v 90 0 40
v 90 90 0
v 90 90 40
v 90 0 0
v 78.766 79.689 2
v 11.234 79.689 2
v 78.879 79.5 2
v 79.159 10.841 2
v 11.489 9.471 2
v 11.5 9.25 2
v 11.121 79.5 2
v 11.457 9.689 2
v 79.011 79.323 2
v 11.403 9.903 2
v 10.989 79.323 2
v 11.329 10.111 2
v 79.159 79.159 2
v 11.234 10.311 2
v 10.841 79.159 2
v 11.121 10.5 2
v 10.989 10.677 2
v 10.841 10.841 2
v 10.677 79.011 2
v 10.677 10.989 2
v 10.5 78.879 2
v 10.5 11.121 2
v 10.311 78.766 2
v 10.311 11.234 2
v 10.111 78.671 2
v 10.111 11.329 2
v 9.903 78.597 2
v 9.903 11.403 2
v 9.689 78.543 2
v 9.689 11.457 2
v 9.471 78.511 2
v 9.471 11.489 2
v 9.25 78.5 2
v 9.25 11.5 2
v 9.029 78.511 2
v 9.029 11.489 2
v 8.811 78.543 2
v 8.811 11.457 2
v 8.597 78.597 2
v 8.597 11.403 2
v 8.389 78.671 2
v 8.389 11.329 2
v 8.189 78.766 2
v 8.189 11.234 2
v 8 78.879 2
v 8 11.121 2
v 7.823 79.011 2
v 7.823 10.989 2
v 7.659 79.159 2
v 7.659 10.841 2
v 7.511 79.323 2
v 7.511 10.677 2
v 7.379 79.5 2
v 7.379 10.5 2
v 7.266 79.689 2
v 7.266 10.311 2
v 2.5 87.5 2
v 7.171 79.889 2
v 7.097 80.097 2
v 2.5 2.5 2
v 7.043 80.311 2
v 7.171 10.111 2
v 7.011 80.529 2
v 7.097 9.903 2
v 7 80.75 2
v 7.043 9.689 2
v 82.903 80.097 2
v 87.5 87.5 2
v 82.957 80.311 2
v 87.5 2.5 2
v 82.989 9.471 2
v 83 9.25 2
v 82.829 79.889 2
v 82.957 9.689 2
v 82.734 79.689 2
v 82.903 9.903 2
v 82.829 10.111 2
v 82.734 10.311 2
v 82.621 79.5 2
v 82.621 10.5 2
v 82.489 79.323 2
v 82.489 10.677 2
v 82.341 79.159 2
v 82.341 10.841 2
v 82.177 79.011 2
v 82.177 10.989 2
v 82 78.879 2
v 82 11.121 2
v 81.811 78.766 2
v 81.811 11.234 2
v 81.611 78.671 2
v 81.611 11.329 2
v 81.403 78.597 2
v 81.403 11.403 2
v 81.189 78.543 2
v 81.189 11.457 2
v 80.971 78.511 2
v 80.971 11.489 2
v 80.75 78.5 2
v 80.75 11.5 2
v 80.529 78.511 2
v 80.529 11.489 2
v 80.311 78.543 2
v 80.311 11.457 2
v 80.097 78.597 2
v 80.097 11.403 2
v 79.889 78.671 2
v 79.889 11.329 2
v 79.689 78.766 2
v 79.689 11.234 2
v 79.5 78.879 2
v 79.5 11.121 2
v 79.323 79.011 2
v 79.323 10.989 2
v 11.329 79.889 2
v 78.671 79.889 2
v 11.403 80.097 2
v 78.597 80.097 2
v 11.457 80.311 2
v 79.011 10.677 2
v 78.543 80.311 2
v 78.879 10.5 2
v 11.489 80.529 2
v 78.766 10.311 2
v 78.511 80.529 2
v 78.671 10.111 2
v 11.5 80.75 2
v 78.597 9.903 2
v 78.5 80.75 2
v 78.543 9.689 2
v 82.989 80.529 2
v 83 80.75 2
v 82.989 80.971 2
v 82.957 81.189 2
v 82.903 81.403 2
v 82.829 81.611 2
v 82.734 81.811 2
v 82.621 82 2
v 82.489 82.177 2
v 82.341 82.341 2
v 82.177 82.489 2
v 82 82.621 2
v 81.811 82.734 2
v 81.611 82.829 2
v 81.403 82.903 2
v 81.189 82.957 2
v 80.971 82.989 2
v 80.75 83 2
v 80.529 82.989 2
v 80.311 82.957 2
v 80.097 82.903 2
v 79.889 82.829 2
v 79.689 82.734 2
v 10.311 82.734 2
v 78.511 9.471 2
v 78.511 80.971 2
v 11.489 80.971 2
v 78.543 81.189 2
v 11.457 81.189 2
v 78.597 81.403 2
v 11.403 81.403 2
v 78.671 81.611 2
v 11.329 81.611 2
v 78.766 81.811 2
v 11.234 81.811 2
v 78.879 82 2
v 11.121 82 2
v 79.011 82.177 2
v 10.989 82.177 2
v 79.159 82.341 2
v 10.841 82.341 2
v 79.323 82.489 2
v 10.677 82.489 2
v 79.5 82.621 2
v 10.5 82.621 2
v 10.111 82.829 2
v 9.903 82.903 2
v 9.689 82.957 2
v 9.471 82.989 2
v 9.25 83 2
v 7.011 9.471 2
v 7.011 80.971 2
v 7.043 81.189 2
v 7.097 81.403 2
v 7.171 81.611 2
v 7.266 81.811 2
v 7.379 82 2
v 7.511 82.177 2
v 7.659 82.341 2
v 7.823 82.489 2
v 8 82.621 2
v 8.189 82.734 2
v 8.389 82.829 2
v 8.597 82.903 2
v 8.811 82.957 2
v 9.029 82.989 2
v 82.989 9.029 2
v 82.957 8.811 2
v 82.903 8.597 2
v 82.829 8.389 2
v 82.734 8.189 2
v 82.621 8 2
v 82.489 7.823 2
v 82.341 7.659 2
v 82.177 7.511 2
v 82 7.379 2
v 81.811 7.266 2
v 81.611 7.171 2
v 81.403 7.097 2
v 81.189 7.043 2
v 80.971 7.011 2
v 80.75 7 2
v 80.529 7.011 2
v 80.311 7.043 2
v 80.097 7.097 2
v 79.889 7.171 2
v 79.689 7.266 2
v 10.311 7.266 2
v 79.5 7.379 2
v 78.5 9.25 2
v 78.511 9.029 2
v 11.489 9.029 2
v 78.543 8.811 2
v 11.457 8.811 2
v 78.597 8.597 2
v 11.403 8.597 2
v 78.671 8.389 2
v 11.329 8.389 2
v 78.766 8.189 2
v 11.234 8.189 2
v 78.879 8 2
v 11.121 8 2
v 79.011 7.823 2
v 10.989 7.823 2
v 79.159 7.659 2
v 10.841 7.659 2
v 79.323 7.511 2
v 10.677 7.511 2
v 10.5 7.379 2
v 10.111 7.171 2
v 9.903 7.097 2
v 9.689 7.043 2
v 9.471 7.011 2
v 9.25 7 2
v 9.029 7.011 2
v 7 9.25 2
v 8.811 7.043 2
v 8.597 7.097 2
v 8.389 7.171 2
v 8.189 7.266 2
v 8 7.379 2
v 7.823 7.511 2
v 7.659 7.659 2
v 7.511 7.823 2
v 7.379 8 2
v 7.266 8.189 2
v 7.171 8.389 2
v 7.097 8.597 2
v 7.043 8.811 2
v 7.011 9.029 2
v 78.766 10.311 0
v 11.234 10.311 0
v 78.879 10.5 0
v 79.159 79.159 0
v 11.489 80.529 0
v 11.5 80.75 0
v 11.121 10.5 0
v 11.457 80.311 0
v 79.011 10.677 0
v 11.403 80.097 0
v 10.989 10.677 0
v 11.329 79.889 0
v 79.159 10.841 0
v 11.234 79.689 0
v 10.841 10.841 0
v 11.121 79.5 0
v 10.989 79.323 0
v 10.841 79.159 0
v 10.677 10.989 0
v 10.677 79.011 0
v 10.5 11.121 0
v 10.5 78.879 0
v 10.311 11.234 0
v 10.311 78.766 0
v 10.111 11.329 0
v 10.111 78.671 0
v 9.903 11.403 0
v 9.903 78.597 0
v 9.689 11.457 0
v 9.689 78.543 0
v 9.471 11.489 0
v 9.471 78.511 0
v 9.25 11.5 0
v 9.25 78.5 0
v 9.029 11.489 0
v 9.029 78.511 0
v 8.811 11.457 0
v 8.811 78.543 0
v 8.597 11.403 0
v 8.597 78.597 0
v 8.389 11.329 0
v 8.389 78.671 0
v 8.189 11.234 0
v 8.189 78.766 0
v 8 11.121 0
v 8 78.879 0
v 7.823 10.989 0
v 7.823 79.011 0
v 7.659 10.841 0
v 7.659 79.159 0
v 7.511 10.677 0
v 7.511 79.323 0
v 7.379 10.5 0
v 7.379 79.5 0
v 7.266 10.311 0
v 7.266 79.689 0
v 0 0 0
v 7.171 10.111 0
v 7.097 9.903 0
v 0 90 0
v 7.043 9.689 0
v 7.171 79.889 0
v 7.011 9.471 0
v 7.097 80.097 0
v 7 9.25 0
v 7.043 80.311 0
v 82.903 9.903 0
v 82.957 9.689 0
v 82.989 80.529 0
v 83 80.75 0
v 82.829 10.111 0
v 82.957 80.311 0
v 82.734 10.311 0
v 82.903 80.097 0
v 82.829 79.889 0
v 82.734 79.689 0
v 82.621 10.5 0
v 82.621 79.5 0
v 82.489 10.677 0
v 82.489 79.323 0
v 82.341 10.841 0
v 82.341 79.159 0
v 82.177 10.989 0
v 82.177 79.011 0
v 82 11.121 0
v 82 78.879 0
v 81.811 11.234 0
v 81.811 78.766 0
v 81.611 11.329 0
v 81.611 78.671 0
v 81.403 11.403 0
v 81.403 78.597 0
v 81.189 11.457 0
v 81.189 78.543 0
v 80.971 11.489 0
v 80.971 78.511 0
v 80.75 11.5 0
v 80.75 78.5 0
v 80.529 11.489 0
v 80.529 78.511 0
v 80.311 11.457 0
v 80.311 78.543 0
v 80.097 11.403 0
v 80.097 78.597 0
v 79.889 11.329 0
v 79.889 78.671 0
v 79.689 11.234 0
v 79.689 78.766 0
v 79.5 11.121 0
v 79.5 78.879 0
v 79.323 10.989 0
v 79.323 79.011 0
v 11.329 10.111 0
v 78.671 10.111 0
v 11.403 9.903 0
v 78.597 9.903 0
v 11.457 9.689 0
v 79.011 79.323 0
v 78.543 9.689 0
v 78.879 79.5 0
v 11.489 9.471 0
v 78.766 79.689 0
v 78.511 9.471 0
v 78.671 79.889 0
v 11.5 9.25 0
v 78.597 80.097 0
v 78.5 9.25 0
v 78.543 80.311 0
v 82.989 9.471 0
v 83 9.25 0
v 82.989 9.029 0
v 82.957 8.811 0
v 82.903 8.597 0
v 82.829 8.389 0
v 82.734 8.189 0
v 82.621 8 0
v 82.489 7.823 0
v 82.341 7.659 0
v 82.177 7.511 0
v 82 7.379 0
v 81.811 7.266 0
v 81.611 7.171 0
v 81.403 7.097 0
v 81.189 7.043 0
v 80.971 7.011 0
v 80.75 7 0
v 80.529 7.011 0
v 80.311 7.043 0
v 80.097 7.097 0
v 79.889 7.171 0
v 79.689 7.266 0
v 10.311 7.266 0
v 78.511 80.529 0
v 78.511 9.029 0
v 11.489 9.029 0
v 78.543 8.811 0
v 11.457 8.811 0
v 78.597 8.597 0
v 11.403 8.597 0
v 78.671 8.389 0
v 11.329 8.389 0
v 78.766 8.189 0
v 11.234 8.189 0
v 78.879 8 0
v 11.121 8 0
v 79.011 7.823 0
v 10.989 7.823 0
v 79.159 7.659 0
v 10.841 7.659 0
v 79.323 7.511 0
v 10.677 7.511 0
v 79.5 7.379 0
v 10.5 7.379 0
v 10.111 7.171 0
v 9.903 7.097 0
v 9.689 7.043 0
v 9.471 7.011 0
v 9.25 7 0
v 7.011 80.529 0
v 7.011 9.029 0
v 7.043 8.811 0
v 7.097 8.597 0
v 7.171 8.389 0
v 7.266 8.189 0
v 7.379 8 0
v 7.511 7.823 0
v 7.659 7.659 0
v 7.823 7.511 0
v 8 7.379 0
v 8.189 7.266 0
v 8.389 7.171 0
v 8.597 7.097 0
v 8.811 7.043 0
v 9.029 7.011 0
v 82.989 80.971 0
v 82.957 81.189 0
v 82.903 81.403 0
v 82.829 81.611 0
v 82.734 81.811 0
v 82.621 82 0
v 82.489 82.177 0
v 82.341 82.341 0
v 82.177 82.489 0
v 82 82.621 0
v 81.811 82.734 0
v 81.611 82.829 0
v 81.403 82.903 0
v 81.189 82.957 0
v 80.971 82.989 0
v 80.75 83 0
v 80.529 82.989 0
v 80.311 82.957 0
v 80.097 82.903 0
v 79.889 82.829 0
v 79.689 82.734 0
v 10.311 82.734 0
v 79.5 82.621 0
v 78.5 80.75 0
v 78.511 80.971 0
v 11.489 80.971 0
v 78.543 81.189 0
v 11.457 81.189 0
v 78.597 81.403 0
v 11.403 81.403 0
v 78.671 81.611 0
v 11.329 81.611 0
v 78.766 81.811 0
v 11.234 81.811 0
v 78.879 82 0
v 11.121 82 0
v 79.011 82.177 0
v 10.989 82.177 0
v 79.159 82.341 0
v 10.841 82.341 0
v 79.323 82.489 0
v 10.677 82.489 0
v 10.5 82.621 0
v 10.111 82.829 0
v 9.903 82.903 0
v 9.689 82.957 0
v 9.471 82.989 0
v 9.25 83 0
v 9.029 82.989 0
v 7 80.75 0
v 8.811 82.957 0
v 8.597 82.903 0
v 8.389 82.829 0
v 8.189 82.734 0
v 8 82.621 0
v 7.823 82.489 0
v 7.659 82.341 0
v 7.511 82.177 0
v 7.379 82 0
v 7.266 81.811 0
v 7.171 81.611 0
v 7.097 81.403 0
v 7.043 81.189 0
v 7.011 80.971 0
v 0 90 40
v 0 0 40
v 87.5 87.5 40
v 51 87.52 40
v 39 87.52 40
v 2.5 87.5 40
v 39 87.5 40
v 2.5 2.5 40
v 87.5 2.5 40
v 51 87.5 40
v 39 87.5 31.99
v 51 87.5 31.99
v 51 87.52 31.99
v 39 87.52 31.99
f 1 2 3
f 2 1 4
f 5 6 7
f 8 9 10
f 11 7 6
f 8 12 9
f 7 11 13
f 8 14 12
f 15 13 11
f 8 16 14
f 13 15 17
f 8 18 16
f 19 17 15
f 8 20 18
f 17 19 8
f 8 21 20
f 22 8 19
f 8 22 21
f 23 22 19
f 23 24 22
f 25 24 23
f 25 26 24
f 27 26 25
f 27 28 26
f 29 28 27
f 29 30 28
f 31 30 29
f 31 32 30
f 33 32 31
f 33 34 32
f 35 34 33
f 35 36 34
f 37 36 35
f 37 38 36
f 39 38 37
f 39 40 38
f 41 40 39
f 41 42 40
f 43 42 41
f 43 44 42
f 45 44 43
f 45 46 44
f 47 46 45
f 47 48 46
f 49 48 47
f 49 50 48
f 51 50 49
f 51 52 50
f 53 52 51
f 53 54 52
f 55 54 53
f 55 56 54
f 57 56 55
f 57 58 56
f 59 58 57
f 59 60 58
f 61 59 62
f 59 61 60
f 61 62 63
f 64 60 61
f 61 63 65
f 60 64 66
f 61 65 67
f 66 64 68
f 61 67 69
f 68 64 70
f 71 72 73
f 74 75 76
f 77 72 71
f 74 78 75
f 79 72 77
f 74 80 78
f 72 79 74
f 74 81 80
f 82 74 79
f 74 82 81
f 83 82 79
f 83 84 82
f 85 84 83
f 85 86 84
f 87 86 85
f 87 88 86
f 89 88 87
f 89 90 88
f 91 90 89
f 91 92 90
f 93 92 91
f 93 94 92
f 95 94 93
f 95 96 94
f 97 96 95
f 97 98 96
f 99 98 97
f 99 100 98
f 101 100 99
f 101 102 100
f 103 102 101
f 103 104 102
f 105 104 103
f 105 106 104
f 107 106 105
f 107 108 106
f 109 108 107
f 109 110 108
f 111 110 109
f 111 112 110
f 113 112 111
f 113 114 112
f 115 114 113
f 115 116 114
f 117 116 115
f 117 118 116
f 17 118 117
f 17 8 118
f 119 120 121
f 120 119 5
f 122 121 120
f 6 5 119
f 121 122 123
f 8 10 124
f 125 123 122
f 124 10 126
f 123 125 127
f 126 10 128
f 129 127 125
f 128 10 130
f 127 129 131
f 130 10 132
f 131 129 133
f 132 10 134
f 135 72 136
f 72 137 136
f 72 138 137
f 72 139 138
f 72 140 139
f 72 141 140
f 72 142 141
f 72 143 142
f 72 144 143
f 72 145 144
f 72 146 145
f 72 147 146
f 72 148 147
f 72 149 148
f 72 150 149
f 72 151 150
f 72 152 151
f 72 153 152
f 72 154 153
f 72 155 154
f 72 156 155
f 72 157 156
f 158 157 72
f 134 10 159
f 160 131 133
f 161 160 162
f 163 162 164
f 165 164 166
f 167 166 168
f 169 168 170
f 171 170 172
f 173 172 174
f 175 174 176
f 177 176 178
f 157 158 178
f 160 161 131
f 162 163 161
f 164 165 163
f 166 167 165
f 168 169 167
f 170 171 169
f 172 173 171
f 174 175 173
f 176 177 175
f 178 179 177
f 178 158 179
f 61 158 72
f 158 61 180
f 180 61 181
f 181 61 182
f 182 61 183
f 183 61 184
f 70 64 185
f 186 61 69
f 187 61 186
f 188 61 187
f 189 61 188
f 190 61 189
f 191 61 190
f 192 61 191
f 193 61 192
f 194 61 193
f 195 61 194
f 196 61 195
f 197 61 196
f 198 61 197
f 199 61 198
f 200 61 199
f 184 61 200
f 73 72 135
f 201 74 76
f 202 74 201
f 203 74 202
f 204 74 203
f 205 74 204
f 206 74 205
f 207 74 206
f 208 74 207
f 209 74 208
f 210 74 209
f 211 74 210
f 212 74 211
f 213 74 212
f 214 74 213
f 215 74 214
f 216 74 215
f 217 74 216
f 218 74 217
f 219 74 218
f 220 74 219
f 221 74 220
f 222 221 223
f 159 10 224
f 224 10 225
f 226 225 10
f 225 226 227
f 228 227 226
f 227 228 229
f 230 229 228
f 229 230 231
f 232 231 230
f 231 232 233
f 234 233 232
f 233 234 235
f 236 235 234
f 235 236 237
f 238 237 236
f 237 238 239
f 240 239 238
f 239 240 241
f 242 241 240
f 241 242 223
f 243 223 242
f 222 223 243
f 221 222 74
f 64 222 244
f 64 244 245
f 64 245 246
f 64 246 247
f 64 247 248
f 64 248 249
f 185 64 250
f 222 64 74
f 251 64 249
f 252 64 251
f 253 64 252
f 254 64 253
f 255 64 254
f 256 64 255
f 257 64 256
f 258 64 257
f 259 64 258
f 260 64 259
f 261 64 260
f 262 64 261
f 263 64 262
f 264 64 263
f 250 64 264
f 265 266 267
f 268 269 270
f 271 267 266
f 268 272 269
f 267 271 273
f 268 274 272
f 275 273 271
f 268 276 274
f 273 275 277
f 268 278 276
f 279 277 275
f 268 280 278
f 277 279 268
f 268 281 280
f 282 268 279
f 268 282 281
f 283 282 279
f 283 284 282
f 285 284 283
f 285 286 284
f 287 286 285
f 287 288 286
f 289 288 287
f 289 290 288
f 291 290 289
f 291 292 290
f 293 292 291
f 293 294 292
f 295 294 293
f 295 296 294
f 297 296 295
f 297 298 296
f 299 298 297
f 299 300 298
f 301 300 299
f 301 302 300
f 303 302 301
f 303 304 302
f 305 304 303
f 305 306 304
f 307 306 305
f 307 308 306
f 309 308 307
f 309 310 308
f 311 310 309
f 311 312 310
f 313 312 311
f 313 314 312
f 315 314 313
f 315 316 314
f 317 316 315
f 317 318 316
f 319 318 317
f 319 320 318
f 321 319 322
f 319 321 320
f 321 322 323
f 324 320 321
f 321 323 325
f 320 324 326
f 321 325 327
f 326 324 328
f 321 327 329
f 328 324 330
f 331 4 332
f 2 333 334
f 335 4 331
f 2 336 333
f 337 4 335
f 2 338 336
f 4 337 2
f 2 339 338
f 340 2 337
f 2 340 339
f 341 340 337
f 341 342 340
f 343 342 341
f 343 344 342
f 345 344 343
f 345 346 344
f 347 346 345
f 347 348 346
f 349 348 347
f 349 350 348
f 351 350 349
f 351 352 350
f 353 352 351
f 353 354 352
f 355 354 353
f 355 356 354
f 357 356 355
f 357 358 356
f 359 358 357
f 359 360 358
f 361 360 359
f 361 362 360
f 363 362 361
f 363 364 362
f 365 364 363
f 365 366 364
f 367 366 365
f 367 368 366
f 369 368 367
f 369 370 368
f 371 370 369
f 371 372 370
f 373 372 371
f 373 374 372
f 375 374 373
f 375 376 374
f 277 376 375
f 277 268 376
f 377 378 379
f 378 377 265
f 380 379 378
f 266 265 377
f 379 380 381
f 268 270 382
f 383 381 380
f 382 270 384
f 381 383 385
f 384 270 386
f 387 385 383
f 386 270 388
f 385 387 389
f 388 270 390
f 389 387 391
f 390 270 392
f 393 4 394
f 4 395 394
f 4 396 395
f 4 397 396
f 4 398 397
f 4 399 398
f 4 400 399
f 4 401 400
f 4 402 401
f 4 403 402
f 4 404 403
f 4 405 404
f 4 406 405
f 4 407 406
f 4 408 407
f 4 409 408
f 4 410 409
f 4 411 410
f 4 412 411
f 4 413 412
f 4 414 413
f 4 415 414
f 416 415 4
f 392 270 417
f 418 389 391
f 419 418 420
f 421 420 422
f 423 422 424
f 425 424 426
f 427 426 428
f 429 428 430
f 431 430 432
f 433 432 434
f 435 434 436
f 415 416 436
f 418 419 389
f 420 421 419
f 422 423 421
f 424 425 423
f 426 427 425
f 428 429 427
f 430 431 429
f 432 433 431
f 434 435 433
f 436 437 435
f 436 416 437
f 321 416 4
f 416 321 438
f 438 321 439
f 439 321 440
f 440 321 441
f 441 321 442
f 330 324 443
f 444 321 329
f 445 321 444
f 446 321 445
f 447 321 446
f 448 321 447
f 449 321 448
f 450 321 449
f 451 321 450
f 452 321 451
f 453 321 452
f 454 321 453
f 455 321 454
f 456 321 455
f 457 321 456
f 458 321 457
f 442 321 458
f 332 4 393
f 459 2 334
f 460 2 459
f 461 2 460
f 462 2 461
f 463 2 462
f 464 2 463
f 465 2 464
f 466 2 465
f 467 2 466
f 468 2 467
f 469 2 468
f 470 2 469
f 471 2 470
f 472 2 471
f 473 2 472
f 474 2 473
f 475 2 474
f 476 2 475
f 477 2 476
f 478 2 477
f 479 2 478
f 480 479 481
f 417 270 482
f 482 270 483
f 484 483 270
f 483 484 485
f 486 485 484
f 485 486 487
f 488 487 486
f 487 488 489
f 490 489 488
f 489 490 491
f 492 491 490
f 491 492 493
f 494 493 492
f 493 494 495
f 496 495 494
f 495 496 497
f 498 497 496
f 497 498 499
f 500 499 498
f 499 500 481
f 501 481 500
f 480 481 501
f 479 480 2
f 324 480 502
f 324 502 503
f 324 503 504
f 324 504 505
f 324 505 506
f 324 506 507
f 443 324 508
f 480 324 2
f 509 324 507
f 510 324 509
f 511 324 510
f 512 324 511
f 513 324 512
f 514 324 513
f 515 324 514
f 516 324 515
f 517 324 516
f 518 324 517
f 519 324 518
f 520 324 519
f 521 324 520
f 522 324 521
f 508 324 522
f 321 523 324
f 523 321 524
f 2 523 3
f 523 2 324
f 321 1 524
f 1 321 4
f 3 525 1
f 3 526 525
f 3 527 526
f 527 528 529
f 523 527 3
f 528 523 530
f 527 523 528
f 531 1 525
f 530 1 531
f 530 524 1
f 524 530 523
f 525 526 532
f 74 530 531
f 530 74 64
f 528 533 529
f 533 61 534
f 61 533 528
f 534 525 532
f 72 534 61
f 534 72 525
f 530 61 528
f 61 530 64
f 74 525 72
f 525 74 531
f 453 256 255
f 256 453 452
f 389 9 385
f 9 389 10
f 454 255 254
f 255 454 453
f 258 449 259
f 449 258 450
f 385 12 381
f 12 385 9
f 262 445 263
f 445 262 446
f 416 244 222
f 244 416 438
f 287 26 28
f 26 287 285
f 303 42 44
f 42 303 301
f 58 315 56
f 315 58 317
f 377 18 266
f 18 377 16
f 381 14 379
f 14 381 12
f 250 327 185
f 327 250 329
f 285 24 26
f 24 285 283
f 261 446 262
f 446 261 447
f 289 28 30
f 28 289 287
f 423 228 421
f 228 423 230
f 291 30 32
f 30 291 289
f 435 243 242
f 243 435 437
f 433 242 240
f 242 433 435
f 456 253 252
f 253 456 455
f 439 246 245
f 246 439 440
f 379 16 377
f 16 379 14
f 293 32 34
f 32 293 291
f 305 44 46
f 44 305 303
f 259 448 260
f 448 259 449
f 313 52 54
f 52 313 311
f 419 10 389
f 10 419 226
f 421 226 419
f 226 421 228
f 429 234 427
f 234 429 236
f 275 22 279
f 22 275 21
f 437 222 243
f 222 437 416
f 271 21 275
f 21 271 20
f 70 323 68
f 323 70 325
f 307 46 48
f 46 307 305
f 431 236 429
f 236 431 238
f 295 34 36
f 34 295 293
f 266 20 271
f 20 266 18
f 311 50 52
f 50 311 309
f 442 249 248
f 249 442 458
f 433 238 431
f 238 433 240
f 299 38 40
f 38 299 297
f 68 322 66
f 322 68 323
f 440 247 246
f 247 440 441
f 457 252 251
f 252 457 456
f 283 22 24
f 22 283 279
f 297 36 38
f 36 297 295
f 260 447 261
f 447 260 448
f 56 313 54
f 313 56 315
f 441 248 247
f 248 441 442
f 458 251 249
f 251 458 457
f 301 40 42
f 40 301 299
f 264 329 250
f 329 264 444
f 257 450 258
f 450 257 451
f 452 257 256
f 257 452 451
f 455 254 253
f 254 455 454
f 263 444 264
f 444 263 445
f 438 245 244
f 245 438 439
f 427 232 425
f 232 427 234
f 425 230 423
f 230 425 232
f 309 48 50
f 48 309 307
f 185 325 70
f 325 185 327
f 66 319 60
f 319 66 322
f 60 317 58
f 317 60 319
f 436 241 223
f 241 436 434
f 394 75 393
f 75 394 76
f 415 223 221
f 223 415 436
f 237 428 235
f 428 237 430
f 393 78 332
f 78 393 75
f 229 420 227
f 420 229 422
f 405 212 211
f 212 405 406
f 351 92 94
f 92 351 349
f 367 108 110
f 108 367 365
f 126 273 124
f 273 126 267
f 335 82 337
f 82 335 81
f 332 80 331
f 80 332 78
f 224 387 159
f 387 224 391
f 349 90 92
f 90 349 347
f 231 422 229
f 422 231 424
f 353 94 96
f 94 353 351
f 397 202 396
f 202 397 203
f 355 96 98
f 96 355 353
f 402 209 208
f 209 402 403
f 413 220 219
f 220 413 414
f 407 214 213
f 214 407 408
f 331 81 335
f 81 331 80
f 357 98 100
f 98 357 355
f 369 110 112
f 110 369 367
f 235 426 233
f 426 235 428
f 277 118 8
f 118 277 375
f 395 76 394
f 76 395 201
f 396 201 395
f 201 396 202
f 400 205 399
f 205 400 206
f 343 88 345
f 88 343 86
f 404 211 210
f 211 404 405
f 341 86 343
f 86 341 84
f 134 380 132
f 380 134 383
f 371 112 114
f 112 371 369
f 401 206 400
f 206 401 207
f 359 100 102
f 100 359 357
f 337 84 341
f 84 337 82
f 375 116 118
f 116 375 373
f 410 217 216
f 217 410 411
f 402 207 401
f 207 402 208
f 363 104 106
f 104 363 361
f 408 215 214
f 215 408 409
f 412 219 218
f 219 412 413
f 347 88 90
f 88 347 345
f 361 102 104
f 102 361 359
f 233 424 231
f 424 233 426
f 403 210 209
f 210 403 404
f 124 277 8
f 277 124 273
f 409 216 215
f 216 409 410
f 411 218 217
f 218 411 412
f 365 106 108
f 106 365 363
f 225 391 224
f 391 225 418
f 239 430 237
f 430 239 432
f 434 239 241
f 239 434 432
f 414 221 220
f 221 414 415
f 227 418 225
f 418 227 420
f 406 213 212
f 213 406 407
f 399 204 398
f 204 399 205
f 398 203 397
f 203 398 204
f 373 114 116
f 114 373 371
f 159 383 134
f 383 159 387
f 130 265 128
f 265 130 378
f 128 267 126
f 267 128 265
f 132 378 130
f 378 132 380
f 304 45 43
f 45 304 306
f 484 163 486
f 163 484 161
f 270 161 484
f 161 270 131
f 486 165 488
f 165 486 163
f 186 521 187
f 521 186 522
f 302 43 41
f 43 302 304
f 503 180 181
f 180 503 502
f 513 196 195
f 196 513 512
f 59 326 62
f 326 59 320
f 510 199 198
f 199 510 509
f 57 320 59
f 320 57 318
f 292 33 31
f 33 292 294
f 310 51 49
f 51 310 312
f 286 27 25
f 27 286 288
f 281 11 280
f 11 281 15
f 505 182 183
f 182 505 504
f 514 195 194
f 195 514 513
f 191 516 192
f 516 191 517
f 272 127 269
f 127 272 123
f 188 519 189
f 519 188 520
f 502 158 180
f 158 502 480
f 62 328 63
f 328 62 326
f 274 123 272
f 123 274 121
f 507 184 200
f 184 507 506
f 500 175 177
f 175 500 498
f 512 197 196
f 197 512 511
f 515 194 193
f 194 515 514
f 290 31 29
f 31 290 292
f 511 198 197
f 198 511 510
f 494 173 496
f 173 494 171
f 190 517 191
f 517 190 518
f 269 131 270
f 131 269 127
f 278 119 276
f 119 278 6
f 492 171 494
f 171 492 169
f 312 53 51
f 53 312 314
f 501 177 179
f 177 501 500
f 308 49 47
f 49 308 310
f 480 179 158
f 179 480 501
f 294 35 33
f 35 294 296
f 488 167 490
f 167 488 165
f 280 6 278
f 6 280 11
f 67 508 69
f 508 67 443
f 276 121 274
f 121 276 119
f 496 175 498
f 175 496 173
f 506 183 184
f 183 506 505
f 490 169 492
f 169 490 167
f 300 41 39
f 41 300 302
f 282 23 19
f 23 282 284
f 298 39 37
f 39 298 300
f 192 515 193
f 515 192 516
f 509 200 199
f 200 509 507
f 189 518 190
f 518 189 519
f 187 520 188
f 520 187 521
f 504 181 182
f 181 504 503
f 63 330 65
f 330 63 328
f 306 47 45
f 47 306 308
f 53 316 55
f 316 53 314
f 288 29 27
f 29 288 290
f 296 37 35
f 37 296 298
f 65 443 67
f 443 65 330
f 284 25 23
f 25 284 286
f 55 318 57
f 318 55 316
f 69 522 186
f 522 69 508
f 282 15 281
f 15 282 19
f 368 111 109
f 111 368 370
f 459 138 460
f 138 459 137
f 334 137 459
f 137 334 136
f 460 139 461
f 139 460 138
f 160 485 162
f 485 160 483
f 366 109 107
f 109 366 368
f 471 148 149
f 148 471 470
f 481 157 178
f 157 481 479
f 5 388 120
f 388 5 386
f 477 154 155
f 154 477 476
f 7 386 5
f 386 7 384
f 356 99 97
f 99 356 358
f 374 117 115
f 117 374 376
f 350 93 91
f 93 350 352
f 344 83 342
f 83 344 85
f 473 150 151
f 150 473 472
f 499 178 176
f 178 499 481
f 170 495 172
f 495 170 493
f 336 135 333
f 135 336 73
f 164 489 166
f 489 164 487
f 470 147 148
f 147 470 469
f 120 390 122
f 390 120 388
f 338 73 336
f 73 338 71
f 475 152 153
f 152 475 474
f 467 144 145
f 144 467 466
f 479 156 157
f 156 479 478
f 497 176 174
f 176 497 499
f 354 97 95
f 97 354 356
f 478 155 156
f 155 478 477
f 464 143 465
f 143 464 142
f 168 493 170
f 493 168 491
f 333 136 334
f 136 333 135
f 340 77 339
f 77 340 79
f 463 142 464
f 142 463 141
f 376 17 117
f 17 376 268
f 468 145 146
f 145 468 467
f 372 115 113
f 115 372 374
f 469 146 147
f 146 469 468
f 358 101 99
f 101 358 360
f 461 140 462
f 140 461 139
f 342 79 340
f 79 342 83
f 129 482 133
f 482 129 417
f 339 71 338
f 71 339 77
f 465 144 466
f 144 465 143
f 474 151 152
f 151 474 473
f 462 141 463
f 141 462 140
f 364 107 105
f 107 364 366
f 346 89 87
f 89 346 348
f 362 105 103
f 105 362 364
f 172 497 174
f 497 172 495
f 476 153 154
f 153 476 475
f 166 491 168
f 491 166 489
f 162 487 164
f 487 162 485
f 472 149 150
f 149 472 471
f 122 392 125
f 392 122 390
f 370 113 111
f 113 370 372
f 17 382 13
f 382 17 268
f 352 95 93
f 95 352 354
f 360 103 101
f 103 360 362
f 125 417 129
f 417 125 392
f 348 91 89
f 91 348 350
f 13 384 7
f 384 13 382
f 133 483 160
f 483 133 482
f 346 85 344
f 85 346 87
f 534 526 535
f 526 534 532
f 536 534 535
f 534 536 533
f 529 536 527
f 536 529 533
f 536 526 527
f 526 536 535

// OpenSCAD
// === Dimensions ===
// Outer width of the box (X)
outer_x = 90;
// Outer depth of the box (Y)
outer_y = 90;
// Height of the walls
wall_height = 40;
// Thickness of the top plate (base in print orientation)
plate_thickness = 2;
// Wall thickness
wall_thickness = 2.5;
// Screw hole diameter
screw_dia = 4.5;
// Square pattern size for screw holes
screw_pattern = 71.5;
// Notch width (along the wall)
notch_width = 12;
// Notch depth into the wall (radial)
notch_depth = 5;
// Notch bottom Z position
notch_bottom_z = 32;
// Notch top Z position (open edge)
notch_top_z = 40;

// === Calculated ===
// Inner dimensions
inner_x = outer_x - 2 * wall_thickness;
inner_y = outer_y - 2 * wall_thickness;

// Centre of the plate
cx = outer_x / 2;
cy = outer_y / 2;

// Screw hole positions (half-pattern)
hp = screw_pattern / 2;

// === Module: Single screw hole ===
module screw_hole() {
    translate([cx - hp, cy - hp, -0.01])
        cylinder(d = screw_dia, h = plate_thickness + 0.02, $fn = 64);
    translate([cx + hp, cy - hp, -0.01])
        cylinder(d = screw_dia, h = plate_thickness + 0.02, $fn = 64);
    translate([cx - hp, cy + hp, -0.01])
        cylinder(d = screw_dia, h = plate_thickness + 0.02, $fn = 64);
    translate([cx + hp, cy + hp, -0.01])
        cylinder(d = screw_dia, h = plate_thickness + 0.02, $fn = 64);
}

// === Module: Notch in the +Y wall ===
module notch() {
    // Cut a notch in the top (+Y) wall
    // The wall is at y = outer_y - wall_thickness to y = outer_y
    // Notch is centred along X at cx
    // Notch extends from z = notch_bottom_z to z = notch_top_z
    // Notch depth into the wall is notch_depth
    translate([cx - notch_width / 2, outer_y - wall_thickness - notch_depth, notch_bottom_z - 0.01])
        cube([notch_width, notch_depth + 0.02, notch_top_z - notch_bottom_z + 0.02]);
}

// === Main body ===
difference() {
    // Outer box (solid)
    union() {
        // Bottom plate
        cube([outer_x, outer_y, plate_thickness]);
        // Four walls
        // Front wall (-Y)
        cube([outer_x, wall_thickness, wall_height]);
        // Back wall (+Y)
        translate([0, outer_y - wall_thickness, 0])
            cube([outer_x, wall_thickness, wall_height]);
        // Left wall (-X)
        translate([0, 0, 0])
            cube([wall_thickness, outer_y, wall_height]);
        // Right wall (+X)
        translate([outer_x - wall_thickness, 0, 0])
            cube([wall_thickness, outer_y, wall_height]);
    }
    
    // Subtract inner cavity
    translate([wall_thickness, wall_thickness, plate_thickness])
        cube([inner_x, inner_y, wall_height - plate_thickness + 0.01]);
    
    // Subtract screw holes
    screw_hole();
    
    // Subtract notch
    notch();
}
